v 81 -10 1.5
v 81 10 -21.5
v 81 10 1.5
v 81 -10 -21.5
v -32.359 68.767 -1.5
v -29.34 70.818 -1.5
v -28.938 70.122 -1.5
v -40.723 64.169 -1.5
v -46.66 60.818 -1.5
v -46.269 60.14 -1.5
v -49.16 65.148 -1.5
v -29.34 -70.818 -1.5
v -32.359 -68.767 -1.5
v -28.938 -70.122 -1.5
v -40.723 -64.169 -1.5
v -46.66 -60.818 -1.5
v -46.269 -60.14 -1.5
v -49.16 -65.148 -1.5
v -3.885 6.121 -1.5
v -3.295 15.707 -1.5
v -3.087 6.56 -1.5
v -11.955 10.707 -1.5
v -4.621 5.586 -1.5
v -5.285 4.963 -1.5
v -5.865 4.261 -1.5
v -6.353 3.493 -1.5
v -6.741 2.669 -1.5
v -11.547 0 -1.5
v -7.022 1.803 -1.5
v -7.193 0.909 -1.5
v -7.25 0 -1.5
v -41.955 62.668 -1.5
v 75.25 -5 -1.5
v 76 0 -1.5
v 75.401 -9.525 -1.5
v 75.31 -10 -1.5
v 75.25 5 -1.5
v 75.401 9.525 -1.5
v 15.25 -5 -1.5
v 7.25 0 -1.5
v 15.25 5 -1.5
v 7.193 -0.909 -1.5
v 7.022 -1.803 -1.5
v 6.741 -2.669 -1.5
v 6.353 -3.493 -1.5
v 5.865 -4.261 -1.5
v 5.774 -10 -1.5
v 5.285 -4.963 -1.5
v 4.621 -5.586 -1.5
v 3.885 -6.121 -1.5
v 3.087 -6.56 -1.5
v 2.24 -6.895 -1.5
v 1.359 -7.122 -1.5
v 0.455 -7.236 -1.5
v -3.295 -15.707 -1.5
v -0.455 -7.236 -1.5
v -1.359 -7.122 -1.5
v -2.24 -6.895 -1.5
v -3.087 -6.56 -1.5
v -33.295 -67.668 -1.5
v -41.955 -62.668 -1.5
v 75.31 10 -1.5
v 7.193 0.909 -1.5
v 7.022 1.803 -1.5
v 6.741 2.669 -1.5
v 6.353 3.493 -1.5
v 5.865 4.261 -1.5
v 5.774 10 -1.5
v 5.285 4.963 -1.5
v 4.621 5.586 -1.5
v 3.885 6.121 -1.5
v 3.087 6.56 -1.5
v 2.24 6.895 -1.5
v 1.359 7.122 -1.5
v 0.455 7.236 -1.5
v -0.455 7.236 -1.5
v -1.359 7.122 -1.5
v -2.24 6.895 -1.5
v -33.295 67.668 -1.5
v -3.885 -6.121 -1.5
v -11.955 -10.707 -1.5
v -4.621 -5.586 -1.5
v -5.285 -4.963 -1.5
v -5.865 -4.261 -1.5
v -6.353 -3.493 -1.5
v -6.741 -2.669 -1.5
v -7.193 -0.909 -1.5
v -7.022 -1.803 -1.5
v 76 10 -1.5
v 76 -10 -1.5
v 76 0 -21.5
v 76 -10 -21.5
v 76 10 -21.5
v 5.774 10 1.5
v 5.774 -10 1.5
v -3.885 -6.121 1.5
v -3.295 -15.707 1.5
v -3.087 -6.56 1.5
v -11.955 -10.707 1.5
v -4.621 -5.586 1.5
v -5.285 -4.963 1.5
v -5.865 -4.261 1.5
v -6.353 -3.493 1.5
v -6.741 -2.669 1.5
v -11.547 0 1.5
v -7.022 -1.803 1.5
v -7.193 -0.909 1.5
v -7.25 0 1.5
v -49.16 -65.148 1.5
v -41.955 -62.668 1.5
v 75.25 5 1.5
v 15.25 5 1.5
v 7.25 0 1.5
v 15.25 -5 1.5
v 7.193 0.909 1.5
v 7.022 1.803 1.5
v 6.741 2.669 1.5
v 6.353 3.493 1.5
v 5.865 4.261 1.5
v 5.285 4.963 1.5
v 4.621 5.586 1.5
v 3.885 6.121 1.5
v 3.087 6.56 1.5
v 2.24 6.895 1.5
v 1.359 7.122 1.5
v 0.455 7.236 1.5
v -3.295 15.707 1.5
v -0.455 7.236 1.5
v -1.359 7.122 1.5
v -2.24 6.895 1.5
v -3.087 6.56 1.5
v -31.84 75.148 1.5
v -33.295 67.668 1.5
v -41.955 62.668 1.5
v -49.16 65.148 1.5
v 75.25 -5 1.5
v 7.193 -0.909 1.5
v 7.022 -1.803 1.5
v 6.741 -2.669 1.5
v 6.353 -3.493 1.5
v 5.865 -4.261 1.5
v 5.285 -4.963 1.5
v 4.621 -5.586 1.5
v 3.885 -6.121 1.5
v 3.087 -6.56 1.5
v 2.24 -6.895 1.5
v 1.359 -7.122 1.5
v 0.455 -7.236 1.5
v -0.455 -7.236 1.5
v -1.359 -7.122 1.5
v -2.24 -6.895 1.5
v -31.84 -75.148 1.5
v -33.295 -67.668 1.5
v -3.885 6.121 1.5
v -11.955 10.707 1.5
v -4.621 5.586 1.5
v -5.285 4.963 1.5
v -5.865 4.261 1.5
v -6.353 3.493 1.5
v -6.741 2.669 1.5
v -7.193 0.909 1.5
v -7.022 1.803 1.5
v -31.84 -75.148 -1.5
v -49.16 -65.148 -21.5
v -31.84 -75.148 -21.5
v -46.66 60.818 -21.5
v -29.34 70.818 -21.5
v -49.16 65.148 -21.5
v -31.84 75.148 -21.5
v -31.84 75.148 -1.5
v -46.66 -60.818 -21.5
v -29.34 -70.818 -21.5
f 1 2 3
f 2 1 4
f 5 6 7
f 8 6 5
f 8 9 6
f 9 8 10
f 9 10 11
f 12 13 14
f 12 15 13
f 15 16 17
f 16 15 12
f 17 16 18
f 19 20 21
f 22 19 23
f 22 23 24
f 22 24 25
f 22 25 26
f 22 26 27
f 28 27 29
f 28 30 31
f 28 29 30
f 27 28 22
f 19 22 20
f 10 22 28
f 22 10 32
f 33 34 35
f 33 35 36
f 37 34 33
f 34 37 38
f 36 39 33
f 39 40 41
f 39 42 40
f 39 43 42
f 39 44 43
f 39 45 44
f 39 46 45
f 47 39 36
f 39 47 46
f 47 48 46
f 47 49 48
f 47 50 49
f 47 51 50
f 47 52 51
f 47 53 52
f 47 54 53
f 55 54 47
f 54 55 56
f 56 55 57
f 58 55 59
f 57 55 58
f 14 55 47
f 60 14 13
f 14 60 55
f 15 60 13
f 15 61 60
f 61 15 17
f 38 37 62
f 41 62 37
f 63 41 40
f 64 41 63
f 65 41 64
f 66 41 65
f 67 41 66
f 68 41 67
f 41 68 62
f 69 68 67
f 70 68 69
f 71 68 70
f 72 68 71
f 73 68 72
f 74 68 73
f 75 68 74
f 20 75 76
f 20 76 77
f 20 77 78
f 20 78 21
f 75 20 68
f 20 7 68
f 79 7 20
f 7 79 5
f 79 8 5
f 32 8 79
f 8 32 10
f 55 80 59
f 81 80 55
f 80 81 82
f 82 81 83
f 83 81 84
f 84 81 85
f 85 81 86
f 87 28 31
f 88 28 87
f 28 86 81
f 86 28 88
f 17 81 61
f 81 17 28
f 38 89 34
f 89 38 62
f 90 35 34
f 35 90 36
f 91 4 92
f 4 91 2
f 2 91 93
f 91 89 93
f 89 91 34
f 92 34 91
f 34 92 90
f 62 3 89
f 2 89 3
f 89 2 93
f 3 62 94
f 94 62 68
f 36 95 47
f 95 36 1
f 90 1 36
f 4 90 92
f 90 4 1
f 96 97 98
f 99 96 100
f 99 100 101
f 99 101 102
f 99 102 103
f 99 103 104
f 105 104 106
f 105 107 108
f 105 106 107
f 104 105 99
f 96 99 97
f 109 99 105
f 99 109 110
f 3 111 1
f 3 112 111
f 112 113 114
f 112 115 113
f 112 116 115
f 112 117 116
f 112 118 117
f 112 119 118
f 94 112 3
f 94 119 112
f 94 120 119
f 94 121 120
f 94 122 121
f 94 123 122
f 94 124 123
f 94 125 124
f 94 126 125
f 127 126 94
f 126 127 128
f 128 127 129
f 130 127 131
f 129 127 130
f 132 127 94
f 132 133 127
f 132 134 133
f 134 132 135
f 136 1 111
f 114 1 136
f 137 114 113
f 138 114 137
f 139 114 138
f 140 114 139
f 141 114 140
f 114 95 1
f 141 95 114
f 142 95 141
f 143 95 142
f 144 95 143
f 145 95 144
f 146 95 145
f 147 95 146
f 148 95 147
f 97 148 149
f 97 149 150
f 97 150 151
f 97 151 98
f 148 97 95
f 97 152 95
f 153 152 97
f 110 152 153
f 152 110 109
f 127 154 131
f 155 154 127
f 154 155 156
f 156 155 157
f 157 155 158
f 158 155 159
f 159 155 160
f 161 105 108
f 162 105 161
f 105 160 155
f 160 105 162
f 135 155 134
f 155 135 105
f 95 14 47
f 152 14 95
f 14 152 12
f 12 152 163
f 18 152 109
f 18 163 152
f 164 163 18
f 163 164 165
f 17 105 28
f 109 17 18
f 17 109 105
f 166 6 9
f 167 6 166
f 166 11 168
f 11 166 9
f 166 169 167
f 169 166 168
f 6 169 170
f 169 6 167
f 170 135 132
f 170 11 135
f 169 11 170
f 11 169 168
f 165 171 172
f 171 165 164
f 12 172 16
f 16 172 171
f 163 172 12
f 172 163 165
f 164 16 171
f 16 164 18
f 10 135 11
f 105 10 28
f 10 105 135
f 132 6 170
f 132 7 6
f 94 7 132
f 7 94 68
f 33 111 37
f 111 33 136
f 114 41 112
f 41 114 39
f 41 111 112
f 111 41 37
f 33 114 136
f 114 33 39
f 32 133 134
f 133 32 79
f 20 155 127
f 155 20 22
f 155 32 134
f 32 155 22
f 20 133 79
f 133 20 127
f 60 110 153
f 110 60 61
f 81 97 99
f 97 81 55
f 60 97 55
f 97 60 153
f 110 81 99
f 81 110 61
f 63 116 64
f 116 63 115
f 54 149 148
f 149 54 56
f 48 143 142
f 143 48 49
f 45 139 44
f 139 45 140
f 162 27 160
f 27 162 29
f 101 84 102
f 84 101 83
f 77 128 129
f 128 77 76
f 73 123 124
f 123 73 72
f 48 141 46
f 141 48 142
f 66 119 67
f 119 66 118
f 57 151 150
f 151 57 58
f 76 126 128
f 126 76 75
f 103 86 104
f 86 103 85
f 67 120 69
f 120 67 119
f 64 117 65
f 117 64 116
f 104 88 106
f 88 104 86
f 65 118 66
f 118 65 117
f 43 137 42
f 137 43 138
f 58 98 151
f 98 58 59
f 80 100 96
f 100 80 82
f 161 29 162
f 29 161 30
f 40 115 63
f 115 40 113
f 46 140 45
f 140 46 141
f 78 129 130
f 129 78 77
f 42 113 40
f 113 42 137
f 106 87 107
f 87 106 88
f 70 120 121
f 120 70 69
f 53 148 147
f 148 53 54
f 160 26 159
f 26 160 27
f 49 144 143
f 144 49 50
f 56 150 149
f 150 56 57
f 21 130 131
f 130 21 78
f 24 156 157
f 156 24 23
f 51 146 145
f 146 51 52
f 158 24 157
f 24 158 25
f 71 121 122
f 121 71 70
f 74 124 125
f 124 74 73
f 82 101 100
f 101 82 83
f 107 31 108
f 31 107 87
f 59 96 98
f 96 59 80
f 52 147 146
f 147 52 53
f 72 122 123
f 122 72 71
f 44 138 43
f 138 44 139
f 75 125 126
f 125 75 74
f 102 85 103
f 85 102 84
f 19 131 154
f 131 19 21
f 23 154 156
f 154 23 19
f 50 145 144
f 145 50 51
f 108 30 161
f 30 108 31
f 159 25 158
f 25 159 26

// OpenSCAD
placer=0; //1 = Generate a Placement tool, so you can use it to place the center dot through the locator tool. 0 = Don't generate. 
locator=1; // 1 = Generate a Locator tool, which is the main tool, 0= Don't generate

arms=3; //Accepts 3 or 4, if you wanted to use more, you'd need to modify the code. Especially the 150*(4-arms)

mirror_diameter=152;
arm_height=3;
arm_width=20;
arm_cutout=60; //along half of each arm
support_height=20;
support_thickness=5;
center_dot_diameter=14; 

center_dot_hole_diameter=center_dot_diameter+0.5; //If using placer, you might add 0.1 - 0.5mm 
center_dot_inner_diameter=4;
close_distance=0; //0 for flat supports touching the mirror, 1 or more for a round support.

placer_length=30;
placer_diameter=center_dot_diameter;

$fn=50;


module locator() {
difference(){
union(){
	//cube([mirror_diameter+support_thickness*2, arm_width, arm_height], center=true);
	
	for (i = [0:arms-1]) {
		rotate([0,0,(360/arms)*i]) {
	translate([mirror_diameter/2-close_distance,-arm_width/2,-arm_height/2-support_height])
		cube([support_thickness+close_distance, arm_width, support_height]);
		}
		rotate([0,0,(360/arms)*i+150*(4-arms)]){ 
			
			translate([0,(mirror_diameter+support_thickness*2)/4,0])
		cube([arm_width, (mirror_diameter+support_thickness*2)/2,  arm_height], center=true);
		}
	}
	
} //union
	translate([0,0,-arm_height/2-support_height])
	cylinder(h=support_height, r=mirror_diameter/2);
	cylinder(h=arm_height*2,r=center_dot_hole_diameter/2, center=true);
    if (arm_cutout > 0) {
	for (i = [0:arms-1]) {
		rotate([0,0,(360/arms)*i]) 
	translate([mirror_diameter/4+center_dot_hole_diameter/2,0,0])
		cube([arm_cutout, arm_width/2, arm_height*2], center=true);
	}
}
}
}


module placer() {
		cylinder(h=placer_length,r=center_dot_diameter/2, center=true);
	
	
}

if (locator == 1 )
locator();
if (placer == 1)
placer();
